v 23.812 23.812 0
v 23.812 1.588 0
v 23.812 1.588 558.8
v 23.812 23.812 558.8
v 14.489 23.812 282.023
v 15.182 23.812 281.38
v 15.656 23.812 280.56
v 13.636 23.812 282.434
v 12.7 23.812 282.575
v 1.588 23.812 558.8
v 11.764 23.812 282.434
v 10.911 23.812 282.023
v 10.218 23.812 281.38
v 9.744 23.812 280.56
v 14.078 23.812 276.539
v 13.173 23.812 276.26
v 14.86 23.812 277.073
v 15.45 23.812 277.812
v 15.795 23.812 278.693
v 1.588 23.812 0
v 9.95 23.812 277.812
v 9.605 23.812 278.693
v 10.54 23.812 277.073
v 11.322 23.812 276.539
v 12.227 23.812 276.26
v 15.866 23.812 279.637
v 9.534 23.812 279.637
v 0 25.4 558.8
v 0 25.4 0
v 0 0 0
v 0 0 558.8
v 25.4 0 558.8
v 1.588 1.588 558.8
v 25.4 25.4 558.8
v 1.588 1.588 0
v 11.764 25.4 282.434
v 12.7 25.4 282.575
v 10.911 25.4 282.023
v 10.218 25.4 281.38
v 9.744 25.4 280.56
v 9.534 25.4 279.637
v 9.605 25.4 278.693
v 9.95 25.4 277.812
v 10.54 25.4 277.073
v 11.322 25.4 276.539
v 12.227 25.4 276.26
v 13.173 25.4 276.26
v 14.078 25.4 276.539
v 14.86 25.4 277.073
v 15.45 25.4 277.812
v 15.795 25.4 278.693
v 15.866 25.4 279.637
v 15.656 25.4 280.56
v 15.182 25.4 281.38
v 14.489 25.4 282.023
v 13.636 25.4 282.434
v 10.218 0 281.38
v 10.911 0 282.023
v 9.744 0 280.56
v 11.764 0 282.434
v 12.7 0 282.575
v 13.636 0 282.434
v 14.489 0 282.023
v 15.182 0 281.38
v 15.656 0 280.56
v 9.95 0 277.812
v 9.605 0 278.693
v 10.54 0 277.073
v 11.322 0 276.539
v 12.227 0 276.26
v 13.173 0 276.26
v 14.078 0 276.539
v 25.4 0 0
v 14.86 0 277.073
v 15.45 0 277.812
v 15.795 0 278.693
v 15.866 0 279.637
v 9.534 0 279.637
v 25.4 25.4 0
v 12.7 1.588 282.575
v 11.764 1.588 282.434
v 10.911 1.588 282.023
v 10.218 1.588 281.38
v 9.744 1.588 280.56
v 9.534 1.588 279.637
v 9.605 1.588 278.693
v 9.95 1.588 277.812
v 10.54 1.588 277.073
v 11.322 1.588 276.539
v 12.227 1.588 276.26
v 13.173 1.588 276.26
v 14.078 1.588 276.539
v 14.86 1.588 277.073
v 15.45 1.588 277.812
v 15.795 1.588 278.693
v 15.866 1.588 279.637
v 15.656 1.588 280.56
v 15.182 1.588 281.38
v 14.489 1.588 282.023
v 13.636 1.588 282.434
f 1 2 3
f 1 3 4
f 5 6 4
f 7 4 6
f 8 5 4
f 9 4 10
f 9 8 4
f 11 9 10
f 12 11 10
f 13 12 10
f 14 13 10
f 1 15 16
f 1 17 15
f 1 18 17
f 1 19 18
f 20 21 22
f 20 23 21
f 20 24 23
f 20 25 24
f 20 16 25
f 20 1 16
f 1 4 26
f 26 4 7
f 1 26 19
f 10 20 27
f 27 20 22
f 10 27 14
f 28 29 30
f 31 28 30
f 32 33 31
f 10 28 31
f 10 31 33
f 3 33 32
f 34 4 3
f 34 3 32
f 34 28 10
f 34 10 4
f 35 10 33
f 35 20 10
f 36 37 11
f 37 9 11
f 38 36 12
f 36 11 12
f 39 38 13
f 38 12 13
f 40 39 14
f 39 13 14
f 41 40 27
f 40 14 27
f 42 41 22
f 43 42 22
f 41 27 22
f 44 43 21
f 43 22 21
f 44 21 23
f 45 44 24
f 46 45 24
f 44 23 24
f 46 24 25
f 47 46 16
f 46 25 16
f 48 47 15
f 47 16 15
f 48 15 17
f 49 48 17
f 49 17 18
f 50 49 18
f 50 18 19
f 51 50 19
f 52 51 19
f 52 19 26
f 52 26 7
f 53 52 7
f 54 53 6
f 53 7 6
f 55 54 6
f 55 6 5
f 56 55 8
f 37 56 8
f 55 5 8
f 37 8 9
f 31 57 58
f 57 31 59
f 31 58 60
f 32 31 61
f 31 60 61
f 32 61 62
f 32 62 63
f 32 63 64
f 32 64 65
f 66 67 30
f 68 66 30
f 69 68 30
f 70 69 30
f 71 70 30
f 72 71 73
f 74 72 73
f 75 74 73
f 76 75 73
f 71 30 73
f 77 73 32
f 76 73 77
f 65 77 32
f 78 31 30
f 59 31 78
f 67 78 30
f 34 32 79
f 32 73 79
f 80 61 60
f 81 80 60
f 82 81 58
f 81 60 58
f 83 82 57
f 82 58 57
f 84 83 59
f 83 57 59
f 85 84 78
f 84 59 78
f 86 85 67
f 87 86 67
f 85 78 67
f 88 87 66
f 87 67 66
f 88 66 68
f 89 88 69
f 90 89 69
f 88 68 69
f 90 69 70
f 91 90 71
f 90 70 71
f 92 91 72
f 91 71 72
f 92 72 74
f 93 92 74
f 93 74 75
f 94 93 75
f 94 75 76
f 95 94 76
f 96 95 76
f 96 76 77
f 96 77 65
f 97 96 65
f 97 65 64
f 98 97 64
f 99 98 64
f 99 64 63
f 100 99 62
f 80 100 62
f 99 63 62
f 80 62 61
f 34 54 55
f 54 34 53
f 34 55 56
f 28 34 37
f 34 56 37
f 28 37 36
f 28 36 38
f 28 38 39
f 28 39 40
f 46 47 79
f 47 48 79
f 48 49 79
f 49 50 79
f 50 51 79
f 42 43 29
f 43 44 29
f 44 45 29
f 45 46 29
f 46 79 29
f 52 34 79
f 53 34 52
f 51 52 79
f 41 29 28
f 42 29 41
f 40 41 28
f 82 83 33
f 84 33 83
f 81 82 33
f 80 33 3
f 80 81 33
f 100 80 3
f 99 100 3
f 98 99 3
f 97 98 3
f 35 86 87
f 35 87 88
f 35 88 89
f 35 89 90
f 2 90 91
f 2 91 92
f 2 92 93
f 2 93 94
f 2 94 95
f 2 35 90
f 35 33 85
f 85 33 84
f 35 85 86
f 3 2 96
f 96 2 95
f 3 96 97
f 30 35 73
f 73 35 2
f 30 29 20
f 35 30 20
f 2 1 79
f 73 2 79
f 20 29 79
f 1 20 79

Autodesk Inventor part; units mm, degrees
ref_plane "YZ Plane" through (0, 0, 0) normal (1, 0, 0) x (0, 1, 0)
ref_plane "XZ Plane" through (0, 0, 0) normal (0, 1, 0) x (-1, 0, 0)
ref_plane "XY Plane" through (0, 0, 0) normal (0, 0, 1) x (1, 0, 0)
sketch "Sketch1" plane through (0, 0, 0) normal (0, 0, 1) x (1, 0, 0)
  line L0 (0, 0) -> (25.4, 0)
  line L1 (25.4, 0) -> (25.4, 25.4)
  line L2 (25.4, 25.4) -> (0, 25.4)
  line L3 (0, 25.4) -> (0, 0)
  line L4 (1.5875, 1.5875) -> (23.8125, 1.5875)
  line L5 (23.8125, 1.5875) -> (23.8125, 23.8125)
  line L6 (23.8125, 23.8125) -> (1.5875, 23.8125)
  line L7 (1.5875, 23.8125) -> (1.5875, 1.5875)
  dimension "d0" = 25.4
  dimension "d1" = 25.4
  dimension "d2" = 1.5875
extrude "Extrusion1" add sketch "Sketch1" along normal blind 558.8
sketch "Sketch3" plane through (0, 25.4, 0) normal (0, 1, 0) x (1, 0, 0)
  line L0 (25.4, 0) -> (0, 0) projected
  line L1 (0, 0) -> (0, -558.8) projected
  line L2 (25.4, -558.8) -> (0, -558.8) projected
  line L3 (25.4, 0) -> (25.4, -558.8) projected
  point P0 (0, 0)
  point P1 (12.7, -279.4)
  dimension "d15" = 279.4
  dimension "d16" = 558.8
  dimension "d17" = 12.7
hole "Hole2" at (12.7, 25.4, 279.4) direction (0, -1, 0) diameter 6.35 end through all clearance for "Flat Head Machine Screw (82)" size "1/4" standard "Ansi Unified Screw Threads"
equation "\"d15\" = 0.5 * d16"
properties part number "ScissorLiftBarMiddle" material "Aluminum 6061"
